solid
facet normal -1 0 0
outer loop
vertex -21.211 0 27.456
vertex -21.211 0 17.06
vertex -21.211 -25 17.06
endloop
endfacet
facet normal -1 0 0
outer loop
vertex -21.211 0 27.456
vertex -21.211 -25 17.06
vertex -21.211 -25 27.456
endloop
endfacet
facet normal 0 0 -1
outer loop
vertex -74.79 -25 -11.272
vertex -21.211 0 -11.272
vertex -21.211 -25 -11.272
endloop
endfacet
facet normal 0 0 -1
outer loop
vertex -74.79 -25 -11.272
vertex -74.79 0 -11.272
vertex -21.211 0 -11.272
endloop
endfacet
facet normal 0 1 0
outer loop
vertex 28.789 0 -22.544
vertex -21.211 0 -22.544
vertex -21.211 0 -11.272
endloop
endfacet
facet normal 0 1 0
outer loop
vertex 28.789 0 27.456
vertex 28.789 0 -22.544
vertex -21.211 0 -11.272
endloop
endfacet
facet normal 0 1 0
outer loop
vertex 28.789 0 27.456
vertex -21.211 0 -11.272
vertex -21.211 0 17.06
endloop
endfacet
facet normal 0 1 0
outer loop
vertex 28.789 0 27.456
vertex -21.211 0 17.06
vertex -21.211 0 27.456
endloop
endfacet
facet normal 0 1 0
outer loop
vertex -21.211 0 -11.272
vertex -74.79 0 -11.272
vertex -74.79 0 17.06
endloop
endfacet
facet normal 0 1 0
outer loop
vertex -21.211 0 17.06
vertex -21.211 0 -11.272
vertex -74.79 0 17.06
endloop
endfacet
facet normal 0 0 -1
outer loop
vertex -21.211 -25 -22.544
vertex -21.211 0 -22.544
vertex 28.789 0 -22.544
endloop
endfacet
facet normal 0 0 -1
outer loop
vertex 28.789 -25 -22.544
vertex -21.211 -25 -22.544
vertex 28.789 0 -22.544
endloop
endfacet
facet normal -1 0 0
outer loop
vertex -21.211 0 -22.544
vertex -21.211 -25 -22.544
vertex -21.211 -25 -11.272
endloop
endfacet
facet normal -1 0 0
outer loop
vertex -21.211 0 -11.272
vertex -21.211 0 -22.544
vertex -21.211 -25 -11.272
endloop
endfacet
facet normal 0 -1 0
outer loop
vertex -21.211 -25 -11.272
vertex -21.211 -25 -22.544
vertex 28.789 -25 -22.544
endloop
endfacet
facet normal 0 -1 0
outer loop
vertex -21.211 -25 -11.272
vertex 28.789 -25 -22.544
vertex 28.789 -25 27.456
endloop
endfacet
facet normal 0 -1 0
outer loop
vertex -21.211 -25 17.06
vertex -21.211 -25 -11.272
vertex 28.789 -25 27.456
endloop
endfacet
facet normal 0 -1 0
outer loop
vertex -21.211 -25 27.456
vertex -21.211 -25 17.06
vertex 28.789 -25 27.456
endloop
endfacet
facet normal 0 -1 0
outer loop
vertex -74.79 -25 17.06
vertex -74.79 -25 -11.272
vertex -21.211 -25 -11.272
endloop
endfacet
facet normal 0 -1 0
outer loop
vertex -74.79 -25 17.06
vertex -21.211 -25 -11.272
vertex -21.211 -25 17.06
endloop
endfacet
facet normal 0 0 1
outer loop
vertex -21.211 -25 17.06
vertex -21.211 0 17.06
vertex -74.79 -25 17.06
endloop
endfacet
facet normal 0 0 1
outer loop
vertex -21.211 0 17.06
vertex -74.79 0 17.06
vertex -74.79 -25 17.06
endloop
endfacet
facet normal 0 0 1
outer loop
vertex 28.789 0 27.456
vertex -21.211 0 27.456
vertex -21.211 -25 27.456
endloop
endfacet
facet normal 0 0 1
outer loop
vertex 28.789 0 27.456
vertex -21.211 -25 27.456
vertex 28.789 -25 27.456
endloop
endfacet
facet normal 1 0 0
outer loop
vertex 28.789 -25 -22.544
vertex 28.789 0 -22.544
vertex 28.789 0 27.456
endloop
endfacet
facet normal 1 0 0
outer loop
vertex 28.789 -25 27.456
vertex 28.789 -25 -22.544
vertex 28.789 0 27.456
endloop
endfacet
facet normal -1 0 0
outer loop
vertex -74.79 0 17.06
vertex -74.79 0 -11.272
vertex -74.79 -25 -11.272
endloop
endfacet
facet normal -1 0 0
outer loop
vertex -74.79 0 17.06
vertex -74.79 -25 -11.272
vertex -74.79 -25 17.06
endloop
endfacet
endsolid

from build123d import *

# Parameters (mm, degrees)
F0_W     = 50
F0_H     = 50
F1_DEPTH = 25
F0_W_2   = 20.7156650722
F0_H_2   = 28.3317221329
F2_DEPTH = 32.8626733273


with BuildPart() as f1:
    # F0 (on Front) → F1 (new body)
    with BuildSketch(Plane.XZ):
        with Locations((3.7886876613, 2.456478402)):
            Rectangle(F0_W, F0_H)
    extrude(amount=F1_DEPTH)



with BuildPart() as f1b:
    # F0 (on Front) → F1, piece 2 (new body)
    with BuildSketch(Plane.XZ):
        with Locations((-64.4318182021, 2.8941002674)):
            Rectangle(F0_W_2, F0_H_2)
    extrude(amount=F1_DEPTH)


with BuildPart() as f1_1:
    add(f1.part)
    # F2 (add, through all): a face of the model
    f2_faces = [f1b.part.faces().sort_by_distance(p)[0] for p in [
        (-54.073985666, -12.5, 2.8941002674),
    ]]

    add(f1b.part)  # F2 merges F1b
    extrude(f2_faces, amount=F2_DEPTH)


solid = f1_1.part
